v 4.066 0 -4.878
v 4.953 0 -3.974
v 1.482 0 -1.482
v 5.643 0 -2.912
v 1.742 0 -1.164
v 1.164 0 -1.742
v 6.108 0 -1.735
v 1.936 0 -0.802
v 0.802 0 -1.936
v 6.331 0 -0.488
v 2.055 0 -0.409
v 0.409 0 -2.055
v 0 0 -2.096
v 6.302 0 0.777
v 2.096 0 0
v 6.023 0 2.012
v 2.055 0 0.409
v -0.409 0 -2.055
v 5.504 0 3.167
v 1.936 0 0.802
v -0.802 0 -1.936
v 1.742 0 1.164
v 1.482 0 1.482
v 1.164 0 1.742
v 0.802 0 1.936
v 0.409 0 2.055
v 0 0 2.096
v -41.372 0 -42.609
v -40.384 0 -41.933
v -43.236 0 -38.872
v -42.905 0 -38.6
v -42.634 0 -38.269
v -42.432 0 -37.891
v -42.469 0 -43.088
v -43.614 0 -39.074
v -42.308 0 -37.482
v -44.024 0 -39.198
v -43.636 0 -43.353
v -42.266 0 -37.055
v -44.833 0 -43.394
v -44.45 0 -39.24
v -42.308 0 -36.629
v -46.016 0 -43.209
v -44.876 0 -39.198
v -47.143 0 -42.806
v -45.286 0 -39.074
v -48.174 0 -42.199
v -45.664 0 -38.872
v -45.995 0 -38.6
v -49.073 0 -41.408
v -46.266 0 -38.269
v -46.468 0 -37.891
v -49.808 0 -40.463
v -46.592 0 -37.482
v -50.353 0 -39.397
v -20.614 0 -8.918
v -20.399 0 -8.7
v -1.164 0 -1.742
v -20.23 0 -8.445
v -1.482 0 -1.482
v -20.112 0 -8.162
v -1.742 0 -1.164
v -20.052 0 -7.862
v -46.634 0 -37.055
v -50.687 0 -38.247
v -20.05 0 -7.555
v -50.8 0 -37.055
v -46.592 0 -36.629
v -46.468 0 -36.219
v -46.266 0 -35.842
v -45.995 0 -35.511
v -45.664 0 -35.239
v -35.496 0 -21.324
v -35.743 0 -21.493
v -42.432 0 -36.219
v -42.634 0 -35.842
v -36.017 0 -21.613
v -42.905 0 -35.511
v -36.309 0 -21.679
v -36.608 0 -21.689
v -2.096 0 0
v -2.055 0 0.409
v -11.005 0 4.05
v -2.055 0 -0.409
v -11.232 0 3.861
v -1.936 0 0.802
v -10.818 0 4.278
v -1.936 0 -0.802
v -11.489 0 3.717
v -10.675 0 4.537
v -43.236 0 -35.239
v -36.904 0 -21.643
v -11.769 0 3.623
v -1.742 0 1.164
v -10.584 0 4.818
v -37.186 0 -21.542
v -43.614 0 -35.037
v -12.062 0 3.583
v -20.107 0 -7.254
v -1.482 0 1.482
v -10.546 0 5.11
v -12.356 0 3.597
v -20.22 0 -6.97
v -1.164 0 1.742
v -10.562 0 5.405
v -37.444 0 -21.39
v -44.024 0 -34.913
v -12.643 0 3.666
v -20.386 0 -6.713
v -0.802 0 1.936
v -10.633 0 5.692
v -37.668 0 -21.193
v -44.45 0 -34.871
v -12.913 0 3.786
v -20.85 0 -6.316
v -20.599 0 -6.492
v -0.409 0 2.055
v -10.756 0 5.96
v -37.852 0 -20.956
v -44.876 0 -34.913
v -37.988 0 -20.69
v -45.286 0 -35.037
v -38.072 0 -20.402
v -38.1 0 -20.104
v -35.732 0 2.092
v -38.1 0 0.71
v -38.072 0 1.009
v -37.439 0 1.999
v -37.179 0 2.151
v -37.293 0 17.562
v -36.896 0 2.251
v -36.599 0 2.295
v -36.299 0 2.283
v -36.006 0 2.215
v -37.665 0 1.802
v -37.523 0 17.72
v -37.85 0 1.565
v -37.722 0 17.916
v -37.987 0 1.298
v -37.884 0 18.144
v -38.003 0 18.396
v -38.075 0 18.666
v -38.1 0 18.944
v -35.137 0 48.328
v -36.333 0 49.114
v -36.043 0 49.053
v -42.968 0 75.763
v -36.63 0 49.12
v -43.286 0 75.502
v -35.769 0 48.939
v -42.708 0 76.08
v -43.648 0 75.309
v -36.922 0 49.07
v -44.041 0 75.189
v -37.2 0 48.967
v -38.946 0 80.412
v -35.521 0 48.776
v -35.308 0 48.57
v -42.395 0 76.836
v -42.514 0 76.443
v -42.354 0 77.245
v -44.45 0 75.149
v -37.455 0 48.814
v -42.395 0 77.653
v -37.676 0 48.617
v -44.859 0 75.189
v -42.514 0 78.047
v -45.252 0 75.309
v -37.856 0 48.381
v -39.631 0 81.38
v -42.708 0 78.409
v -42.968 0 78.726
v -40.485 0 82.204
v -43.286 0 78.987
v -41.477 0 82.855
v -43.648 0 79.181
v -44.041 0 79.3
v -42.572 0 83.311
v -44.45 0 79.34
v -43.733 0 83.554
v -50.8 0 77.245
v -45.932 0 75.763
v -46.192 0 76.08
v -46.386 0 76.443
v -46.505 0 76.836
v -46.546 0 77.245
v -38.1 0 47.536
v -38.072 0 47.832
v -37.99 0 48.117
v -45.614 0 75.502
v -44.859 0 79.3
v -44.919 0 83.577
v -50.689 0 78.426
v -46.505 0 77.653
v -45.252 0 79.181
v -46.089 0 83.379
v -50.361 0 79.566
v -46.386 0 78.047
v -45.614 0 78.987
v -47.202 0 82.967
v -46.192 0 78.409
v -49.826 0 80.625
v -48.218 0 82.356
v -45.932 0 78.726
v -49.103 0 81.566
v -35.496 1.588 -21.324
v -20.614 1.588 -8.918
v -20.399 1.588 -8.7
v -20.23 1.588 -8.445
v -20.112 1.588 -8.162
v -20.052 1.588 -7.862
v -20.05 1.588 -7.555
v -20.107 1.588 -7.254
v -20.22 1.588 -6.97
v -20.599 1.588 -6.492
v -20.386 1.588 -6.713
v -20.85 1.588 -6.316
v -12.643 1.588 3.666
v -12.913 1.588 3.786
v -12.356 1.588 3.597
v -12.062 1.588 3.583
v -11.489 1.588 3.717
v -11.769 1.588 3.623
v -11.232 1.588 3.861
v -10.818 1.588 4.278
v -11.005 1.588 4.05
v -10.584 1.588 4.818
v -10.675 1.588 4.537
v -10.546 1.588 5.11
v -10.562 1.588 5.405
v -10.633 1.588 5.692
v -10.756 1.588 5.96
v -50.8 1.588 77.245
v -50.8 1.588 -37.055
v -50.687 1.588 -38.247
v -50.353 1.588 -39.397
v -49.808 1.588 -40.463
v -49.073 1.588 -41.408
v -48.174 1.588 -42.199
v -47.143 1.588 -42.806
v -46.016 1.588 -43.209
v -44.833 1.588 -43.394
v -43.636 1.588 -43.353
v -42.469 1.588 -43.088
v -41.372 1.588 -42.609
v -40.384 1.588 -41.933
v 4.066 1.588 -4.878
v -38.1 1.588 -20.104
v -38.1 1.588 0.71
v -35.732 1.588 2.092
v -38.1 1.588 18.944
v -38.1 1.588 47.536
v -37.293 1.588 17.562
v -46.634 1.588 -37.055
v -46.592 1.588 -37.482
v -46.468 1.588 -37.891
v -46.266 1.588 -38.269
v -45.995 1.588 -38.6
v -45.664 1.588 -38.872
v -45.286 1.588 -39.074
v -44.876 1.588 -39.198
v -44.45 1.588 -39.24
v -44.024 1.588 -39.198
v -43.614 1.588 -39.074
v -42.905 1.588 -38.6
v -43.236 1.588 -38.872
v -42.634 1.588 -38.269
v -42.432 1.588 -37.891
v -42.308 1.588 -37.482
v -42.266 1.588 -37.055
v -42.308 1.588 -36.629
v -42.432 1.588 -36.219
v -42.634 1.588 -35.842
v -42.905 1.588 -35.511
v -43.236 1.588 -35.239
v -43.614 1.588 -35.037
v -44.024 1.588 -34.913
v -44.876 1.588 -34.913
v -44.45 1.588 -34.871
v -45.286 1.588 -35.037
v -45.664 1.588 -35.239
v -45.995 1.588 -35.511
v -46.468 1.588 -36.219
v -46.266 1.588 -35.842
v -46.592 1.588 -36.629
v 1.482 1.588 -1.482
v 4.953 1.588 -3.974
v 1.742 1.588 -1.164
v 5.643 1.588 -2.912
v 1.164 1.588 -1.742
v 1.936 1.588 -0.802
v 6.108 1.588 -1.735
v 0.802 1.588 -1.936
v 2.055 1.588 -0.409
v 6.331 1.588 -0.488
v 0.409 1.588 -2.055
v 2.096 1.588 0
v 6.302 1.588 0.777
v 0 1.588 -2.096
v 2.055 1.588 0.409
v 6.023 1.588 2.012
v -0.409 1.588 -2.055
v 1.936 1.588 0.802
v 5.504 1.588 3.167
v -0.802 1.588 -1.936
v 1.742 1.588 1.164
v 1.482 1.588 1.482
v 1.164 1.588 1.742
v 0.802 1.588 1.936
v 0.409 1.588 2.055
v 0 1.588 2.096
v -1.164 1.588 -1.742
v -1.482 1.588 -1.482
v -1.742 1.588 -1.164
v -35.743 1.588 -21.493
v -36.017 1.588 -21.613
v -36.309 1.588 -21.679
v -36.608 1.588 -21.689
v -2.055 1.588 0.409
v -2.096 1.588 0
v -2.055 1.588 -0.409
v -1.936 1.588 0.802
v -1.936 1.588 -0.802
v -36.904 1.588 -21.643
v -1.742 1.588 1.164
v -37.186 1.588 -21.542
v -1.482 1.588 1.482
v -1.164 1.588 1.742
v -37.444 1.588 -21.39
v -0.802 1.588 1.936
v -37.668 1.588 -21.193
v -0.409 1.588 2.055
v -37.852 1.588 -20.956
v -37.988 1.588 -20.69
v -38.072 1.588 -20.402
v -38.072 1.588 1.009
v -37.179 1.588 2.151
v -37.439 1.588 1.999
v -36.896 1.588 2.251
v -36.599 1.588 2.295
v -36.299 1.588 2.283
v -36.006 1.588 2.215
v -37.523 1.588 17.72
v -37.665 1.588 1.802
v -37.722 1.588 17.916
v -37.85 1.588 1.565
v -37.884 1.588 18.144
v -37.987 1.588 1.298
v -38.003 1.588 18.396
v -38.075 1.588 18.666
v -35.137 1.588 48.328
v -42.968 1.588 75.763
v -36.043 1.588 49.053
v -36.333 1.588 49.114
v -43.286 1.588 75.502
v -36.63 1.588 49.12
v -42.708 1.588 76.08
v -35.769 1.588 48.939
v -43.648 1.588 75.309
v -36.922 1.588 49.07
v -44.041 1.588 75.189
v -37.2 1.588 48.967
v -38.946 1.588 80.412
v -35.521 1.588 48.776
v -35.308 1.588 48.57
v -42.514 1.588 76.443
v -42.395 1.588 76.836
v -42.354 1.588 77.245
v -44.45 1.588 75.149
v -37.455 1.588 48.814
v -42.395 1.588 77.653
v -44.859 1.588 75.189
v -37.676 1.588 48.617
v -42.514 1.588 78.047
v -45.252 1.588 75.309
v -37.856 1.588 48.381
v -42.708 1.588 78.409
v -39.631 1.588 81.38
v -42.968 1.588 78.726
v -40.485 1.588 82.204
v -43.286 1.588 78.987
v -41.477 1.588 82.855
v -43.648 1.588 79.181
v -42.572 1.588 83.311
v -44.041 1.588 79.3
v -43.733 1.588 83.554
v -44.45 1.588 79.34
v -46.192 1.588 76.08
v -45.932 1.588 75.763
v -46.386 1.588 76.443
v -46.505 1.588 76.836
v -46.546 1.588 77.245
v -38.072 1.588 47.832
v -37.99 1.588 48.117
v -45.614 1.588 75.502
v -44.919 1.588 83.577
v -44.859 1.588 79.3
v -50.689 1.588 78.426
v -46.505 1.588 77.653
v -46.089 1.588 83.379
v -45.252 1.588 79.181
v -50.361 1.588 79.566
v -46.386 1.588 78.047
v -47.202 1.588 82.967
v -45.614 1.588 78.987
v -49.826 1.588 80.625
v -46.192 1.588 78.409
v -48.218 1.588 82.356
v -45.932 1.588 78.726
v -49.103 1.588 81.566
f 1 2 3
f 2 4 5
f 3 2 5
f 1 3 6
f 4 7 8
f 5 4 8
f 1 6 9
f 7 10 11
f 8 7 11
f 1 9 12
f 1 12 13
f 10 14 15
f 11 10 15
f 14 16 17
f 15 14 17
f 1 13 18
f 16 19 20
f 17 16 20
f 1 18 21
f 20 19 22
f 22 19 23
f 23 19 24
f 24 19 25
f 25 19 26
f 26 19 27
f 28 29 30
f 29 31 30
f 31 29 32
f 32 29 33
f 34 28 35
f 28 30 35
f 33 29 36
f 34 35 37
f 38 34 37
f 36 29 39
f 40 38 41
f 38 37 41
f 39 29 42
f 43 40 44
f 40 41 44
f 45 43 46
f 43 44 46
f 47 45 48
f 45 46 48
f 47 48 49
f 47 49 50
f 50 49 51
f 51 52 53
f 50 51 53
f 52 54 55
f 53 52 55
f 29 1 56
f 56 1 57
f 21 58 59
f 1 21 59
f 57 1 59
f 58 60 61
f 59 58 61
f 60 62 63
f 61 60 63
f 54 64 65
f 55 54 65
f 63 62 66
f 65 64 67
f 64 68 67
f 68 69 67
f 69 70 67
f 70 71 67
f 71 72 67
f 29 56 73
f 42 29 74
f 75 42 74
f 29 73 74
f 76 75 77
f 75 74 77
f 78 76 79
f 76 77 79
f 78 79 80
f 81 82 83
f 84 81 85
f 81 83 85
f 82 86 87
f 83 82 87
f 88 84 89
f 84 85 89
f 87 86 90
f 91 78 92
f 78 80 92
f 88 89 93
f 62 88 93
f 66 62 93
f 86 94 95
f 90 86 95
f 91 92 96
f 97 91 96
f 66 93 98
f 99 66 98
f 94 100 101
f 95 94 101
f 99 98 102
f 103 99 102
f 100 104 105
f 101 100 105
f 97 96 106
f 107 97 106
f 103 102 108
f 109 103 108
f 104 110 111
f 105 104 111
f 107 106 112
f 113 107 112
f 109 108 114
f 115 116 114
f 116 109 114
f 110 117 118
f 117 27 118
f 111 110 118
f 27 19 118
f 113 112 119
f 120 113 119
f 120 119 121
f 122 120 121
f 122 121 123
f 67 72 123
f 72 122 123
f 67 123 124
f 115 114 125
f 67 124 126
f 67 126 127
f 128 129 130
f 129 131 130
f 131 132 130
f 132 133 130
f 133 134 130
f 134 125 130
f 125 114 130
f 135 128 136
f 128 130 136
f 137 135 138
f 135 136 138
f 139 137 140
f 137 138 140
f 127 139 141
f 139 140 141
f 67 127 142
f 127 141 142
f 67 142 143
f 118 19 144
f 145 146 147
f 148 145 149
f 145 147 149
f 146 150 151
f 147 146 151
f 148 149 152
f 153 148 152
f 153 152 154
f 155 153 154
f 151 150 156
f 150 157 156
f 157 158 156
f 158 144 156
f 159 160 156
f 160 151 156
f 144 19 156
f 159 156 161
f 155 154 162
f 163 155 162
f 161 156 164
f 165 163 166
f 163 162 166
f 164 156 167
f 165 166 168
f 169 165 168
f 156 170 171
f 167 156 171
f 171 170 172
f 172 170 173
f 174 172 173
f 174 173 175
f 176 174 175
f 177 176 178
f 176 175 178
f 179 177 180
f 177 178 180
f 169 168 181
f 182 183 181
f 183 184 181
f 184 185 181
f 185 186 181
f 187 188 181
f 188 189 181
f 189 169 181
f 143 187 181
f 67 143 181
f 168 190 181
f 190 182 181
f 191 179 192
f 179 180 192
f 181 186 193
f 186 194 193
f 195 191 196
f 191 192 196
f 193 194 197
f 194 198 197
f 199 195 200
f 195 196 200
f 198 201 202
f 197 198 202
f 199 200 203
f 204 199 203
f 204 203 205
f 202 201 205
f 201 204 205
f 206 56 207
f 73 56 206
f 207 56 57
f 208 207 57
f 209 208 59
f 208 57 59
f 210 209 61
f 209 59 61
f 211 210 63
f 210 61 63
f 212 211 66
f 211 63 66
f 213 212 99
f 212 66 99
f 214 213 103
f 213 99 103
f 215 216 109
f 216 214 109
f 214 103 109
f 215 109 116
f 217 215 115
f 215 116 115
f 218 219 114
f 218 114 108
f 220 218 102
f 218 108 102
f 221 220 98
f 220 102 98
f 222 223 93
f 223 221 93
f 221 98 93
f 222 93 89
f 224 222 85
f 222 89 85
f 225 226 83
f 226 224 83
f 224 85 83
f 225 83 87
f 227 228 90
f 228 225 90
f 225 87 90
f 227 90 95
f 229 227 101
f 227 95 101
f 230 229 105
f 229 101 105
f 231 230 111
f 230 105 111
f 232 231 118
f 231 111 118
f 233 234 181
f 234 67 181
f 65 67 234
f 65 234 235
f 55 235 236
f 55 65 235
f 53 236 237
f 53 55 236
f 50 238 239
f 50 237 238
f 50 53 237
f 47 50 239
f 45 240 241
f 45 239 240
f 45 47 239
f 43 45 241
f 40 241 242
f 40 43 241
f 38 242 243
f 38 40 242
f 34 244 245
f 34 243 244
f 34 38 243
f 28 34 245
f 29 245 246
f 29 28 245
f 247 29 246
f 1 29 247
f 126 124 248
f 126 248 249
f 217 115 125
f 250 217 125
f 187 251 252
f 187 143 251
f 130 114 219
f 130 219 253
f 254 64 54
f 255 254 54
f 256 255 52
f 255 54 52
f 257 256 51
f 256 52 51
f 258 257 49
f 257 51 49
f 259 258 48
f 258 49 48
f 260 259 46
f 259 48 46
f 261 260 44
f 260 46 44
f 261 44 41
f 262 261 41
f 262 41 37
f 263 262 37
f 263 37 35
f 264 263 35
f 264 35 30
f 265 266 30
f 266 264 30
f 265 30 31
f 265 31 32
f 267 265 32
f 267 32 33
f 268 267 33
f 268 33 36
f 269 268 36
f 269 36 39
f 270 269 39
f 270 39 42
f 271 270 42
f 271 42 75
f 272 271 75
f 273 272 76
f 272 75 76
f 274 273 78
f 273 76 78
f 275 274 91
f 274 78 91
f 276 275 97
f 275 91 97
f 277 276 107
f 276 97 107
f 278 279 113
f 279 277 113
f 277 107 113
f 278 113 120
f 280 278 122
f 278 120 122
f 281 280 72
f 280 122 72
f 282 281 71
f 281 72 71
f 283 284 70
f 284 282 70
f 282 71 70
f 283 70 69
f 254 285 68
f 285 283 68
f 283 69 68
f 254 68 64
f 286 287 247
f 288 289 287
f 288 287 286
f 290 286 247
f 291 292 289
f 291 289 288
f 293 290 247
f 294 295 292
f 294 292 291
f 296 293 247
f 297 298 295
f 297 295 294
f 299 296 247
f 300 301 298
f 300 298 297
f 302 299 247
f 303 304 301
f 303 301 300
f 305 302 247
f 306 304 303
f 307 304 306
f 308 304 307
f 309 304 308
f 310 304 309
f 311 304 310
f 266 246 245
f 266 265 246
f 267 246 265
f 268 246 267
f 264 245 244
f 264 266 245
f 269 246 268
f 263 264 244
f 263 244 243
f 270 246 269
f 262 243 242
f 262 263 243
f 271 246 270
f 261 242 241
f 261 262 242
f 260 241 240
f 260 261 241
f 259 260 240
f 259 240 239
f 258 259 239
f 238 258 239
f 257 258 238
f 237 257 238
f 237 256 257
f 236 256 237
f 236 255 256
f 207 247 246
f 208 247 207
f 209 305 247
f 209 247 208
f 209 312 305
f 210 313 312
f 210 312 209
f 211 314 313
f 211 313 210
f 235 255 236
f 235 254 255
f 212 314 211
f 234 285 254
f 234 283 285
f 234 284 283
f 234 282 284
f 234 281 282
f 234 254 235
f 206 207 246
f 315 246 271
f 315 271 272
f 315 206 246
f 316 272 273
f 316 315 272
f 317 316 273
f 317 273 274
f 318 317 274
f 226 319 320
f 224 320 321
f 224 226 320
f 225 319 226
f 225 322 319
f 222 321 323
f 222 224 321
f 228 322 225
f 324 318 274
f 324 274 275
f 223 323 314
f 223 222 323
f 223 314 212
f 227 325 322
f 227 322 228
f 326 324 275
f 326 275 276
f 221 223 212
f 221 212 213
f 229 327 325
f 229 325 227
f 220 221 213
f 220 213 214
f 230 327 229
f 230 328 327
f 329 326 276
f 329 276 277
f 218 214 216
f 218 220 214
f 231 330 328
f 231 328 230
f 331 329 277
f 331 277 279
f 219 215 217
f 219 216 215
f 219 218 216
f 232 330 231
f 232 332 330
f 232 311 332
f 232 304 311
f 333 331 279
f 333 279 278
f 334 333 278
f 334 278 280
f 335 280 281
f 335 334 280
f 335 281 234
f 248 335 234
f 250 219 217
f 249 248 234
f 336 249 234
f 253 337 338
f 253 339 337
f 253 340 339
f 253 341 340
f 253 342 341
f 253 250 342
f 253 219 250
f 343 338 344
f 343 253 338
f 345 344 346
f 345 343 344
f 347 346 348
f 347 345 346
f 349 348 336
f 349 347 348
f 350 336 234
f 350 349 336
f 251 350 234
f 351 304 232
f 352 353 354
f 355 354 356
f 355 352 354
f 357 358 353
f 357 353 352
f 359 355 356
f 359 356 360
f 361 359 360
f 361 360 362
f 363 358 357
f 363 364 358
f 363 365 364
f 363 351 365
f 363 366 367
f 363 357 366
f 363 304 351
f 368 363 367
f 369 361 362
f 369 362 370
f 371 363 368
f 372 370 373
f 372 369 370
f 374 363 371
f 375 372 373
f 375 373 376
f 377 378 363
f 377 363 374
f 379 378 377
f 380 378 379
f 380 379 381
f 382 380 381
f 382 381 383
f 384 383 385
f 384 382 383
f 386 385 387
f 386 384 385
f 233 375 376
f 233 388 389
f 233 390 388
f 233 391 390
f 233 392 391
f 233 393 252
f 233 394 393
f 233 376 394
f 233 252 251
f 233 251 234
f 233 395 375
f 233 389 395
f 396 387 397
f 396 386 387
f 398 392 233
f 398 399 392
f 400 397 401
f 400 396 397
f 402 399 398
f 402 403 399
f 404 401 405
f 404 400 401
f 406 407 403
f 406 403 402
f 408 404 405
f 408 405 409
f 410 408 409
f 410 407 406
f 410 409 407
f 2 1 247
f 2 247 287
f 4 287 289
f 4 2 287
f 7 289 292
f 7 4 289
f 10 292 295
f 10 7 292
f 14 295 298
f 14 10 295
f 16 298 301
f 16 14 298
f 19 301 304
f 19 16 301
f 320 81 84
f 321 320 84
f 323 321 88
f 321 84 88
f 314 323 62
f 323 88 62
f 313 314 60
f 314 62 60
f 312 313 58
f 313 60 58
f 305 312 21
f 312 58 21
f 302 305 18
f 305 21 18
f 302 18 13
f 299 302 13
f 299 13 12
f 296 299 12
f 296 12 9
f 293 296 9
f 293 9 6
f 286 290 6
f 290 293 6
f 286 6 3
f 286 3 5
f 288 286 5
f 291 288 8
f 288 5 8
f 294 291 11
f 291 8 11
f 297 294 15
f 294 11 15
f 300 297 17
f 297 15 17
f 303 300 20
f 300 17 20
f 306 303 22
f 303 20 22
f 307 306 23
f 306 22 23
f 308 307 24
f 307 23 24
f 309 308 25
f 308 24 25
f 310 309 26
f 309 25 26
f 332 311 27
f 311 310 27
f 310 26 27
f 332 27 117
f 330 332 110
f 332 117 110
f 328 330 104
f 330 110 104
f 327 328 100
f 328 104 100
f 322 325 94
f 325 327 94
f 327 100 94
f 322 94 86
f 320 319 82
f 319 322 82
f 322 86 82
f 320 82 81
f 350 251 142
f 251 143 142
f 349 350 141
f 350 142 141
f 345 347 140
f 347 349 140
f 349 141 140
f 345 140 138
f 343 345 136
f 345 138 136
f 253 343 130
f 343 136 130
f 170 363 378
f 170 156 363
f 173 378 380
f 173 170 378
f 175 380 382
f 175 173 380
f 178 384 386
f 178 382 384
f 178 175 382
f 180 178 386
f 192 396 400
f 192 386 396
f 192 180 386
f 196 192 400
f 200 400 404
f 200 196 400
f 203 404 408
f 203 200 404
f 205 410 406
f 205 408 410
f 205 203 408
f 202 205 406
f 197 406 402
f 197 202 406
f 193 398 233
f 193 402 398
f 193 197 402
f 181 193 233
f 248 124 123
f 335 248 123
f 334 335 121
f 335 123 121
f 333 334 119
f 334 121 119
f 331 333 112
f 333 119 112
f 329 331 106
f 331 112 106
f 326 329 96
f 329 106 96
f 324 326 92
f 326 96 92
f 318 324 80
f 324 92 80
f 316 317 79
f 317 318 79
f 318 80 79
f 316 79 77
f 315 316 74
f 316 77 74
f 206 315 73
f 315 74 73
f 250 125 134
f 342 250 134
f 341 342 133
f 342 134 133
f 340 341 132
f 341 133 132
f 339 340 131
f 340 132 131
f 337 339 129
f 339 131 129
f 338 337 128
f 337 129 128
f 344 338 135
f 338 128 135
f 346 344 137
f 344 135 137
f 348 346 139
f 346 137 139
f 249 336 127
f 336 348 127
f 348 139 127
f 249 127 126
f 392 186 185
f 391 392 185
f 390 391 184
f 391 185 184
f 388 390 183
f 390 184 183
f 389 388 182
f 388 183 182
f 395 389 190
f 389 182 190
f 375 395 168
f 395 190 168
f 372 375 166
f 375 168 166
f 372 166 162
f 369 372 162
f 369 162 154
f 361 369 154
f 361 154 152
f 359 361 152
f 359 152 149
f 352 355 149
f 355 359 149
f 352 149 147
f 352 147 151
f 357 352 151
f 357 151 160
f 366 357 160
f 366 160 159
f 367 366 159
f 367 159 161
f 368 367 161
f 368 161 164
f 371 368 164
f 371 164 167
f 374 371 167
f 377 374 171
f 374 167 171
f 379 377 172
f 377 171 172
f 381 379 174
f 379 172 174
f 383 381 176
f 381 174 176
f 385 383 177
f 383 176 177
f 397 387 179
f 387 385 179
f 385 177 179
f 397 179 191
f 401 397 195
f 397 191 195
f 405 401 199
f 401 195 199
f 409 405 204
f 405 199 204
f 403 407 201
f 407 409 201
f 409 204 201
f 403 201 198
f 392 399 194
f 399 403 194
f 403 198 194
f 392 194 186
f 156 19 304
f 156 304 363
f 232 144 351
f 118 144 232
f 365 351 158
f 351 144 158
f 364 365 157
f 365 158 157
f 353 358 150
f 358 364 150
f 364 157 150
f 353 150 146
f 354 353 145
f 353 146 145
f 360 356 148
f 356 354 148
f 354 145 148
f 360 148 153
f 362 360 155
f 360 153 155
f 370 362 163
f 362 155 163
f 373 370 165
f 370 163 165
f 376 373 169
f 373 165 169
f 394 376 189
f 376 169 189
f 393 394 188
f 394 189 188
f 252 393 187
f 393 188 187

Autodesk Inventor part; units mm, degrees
ref_plane "YZ Plane" through (0, 0, 0) normal (1, 0, 0) x (0, 1, 0)
ref_plane "XZ Plane" through (0, 0, 0) normal (0, 1, 0) x (-1, 0, 0)
ref_plane "XY Plane" through (0, 0, 0) normal (0, 0, 1) x (1, 0, 0)
sketch "main" plane through (0, 0, 0) normal (0, 0, 1) x (1, 0, 0)
  arc A0 (21.831, -6.1969) -> (19.4626, -4.8147) centre (20.2435, -6.1969) ccw
  line L0 (4.5808, -13.2233) -> (19.4626, -4.8147)
  circle A1 centre (-16.269, -6.907) radius 2.0955
  arc A2 (-21.7728, -3.7399) -> (-20.3351, -11.7845) centre (-16.269, -6.907) ccw
  line L1 (34.531, -43.9625) -> (34.531, 70.3375)
  arc A3 (-5.5129, -0.9469) -> (-3.356, -3.1208) centre (-4.137, -1.7387) ccw
  line L2 (-3.356, -3.1208) -> (21.0244, 10.6548)
  arc A4 (21.0244, 10.6548) -> (21.831, 12.037) centre (20.2435, 12.037) ccw
  line L3 (21.831, 12.037) -> (21.831, 40.6294)
  line L4 (18.8676, 41.4212) -> (-5.5129, -0.9469)
  line L5 (-21.7728, -3.7399) -> (22.6772, 73.5046)
  arc A5 (21.831, 40.6294) -> (18.8676, 41.4212) centre (20.2435, 40.6294) ccw
  circle A6 centre (28.181, 70.3375) radius 2.0955
  arc A7 (34.531, 70.3375) -> (22.6772, 73.5046) centre (28.181, 70.3375) ccw
  circle A8 centre (28.181, -43.9625) radius 2.1844
  arc A9 (24.1149, -48.84) -> (34.531, -43.9625) centre (28.181, -43.9625) ccw
  line L6 (24.1149, -48.84) -> (-20.3351, -11.7845)
  arc A10 (4.5808, -13.2233) -> (4.3452, -15.8248) centre (5.3617, -14.6055) ccw
  line L7 (21.831, -27.0116) -> (21.831, -6.1969)
  arc A11 (19.227, -28.2309) -> (21.831, -27.0116) centre (20.2435, -27.0116) ccw
  line L8 (4.3452, -15.8248) -> (19.227, -28.2309)
  point P0 (5.1171, -4.3382)
  point P1 (1.8899, -30.3122)
  point P2 (11.7861, -22.0279)
  dimension "d1" = 12.7
  dimension "d2" = 12.7
  dimension "d3" = 12.7
  dimension "d4" = 1.5875
  dimension "d5" = 12.7
  dimension "d6" = 1.5875
  dimension "d7" = 1.5875
  dimension "d10" = 114.3
  dimension "d12" = 12.7
  dimension "d13" = 12.7
  dimension "d14" = 13.187
  dimension "d16" = 44.45
  dimension "d17" = 12.7
sketch "Sketch1" plane through (0, 0, 0) normal (0, 1, 0) x (-1, 0, 0)
  arc A0 (38.1, 0.7102) -> (35.7316, 2.0923) centre (36.5125, 0.7102) ccw
  line L0 (20.8498, -6.3163) -> (35.7316, 2.0923)
  circle A1 centre (0, 0) radius 2.0955
  arc A2 (-5.5038, 3.1671) -> (-4.0661, -4.8775) centre (0, 0) ccw
  line L1 (50.8, -37.0554) -> (50.8, 77.2446)
  arc A3 (10.7561, 5.9602) -> (12.9129, 3.7863) centre (12.132, 5.1684) ccw
  line L2 (12.9129, 3.7863) -> (37.2934, 17.5619)
  arc A4 (37.2934, 17.5619) -> (38.1, 18.944) centre (36.5125, 18.944) ccw
  line L3 (38.1, 18.944) -> (38.1, 47.5364)
  line L4 (35.1366, 48.3282) -> (10.7561, 5.9602)
  line L5 (-5.5038, 3.1671) -> (38.9462, 80.4117)
  arc A5 (38.1, 47.5364) -> (35.1366, 48.3282) centre (36.5125, 47.5364) ccw
  circle A6 centre (44.45, 77.2446) radius 2.0955
  arc A7 (50.8, 77.2446) -> (38.9462, 80.4117) centre (44.45, 77.2446) ccw
  circle A8 centre (44.45, -37.0554) radius 2.1844
  arc A9 (40.3839, -41.9329) -> (50.8, -37.0554) centre (44.45, -37.0554) ccw
  line L6 (40.3839, -41.9329) -> (-4.0661, -4.8775)
  arc A10 (20.8498, -6.3163) -> (20.6142, -8.9178) centre (21.6307, -7.6984) ccw
  line L7 (38.1, -20.1045) -> (38.1, 0.7102)
  arc A11 (35.496, -21.3239) -> (38.1, -20.1045) centre (36.5125, -20.1045) ccw
  line L8 (20.6142, -8.9178) -> (35.496, -21.3239)
extrude "Extrusion1" add sketch "Sketch1" along normal blind 1.5875
properties part number "gusset" material "Acetal Resin, White"
